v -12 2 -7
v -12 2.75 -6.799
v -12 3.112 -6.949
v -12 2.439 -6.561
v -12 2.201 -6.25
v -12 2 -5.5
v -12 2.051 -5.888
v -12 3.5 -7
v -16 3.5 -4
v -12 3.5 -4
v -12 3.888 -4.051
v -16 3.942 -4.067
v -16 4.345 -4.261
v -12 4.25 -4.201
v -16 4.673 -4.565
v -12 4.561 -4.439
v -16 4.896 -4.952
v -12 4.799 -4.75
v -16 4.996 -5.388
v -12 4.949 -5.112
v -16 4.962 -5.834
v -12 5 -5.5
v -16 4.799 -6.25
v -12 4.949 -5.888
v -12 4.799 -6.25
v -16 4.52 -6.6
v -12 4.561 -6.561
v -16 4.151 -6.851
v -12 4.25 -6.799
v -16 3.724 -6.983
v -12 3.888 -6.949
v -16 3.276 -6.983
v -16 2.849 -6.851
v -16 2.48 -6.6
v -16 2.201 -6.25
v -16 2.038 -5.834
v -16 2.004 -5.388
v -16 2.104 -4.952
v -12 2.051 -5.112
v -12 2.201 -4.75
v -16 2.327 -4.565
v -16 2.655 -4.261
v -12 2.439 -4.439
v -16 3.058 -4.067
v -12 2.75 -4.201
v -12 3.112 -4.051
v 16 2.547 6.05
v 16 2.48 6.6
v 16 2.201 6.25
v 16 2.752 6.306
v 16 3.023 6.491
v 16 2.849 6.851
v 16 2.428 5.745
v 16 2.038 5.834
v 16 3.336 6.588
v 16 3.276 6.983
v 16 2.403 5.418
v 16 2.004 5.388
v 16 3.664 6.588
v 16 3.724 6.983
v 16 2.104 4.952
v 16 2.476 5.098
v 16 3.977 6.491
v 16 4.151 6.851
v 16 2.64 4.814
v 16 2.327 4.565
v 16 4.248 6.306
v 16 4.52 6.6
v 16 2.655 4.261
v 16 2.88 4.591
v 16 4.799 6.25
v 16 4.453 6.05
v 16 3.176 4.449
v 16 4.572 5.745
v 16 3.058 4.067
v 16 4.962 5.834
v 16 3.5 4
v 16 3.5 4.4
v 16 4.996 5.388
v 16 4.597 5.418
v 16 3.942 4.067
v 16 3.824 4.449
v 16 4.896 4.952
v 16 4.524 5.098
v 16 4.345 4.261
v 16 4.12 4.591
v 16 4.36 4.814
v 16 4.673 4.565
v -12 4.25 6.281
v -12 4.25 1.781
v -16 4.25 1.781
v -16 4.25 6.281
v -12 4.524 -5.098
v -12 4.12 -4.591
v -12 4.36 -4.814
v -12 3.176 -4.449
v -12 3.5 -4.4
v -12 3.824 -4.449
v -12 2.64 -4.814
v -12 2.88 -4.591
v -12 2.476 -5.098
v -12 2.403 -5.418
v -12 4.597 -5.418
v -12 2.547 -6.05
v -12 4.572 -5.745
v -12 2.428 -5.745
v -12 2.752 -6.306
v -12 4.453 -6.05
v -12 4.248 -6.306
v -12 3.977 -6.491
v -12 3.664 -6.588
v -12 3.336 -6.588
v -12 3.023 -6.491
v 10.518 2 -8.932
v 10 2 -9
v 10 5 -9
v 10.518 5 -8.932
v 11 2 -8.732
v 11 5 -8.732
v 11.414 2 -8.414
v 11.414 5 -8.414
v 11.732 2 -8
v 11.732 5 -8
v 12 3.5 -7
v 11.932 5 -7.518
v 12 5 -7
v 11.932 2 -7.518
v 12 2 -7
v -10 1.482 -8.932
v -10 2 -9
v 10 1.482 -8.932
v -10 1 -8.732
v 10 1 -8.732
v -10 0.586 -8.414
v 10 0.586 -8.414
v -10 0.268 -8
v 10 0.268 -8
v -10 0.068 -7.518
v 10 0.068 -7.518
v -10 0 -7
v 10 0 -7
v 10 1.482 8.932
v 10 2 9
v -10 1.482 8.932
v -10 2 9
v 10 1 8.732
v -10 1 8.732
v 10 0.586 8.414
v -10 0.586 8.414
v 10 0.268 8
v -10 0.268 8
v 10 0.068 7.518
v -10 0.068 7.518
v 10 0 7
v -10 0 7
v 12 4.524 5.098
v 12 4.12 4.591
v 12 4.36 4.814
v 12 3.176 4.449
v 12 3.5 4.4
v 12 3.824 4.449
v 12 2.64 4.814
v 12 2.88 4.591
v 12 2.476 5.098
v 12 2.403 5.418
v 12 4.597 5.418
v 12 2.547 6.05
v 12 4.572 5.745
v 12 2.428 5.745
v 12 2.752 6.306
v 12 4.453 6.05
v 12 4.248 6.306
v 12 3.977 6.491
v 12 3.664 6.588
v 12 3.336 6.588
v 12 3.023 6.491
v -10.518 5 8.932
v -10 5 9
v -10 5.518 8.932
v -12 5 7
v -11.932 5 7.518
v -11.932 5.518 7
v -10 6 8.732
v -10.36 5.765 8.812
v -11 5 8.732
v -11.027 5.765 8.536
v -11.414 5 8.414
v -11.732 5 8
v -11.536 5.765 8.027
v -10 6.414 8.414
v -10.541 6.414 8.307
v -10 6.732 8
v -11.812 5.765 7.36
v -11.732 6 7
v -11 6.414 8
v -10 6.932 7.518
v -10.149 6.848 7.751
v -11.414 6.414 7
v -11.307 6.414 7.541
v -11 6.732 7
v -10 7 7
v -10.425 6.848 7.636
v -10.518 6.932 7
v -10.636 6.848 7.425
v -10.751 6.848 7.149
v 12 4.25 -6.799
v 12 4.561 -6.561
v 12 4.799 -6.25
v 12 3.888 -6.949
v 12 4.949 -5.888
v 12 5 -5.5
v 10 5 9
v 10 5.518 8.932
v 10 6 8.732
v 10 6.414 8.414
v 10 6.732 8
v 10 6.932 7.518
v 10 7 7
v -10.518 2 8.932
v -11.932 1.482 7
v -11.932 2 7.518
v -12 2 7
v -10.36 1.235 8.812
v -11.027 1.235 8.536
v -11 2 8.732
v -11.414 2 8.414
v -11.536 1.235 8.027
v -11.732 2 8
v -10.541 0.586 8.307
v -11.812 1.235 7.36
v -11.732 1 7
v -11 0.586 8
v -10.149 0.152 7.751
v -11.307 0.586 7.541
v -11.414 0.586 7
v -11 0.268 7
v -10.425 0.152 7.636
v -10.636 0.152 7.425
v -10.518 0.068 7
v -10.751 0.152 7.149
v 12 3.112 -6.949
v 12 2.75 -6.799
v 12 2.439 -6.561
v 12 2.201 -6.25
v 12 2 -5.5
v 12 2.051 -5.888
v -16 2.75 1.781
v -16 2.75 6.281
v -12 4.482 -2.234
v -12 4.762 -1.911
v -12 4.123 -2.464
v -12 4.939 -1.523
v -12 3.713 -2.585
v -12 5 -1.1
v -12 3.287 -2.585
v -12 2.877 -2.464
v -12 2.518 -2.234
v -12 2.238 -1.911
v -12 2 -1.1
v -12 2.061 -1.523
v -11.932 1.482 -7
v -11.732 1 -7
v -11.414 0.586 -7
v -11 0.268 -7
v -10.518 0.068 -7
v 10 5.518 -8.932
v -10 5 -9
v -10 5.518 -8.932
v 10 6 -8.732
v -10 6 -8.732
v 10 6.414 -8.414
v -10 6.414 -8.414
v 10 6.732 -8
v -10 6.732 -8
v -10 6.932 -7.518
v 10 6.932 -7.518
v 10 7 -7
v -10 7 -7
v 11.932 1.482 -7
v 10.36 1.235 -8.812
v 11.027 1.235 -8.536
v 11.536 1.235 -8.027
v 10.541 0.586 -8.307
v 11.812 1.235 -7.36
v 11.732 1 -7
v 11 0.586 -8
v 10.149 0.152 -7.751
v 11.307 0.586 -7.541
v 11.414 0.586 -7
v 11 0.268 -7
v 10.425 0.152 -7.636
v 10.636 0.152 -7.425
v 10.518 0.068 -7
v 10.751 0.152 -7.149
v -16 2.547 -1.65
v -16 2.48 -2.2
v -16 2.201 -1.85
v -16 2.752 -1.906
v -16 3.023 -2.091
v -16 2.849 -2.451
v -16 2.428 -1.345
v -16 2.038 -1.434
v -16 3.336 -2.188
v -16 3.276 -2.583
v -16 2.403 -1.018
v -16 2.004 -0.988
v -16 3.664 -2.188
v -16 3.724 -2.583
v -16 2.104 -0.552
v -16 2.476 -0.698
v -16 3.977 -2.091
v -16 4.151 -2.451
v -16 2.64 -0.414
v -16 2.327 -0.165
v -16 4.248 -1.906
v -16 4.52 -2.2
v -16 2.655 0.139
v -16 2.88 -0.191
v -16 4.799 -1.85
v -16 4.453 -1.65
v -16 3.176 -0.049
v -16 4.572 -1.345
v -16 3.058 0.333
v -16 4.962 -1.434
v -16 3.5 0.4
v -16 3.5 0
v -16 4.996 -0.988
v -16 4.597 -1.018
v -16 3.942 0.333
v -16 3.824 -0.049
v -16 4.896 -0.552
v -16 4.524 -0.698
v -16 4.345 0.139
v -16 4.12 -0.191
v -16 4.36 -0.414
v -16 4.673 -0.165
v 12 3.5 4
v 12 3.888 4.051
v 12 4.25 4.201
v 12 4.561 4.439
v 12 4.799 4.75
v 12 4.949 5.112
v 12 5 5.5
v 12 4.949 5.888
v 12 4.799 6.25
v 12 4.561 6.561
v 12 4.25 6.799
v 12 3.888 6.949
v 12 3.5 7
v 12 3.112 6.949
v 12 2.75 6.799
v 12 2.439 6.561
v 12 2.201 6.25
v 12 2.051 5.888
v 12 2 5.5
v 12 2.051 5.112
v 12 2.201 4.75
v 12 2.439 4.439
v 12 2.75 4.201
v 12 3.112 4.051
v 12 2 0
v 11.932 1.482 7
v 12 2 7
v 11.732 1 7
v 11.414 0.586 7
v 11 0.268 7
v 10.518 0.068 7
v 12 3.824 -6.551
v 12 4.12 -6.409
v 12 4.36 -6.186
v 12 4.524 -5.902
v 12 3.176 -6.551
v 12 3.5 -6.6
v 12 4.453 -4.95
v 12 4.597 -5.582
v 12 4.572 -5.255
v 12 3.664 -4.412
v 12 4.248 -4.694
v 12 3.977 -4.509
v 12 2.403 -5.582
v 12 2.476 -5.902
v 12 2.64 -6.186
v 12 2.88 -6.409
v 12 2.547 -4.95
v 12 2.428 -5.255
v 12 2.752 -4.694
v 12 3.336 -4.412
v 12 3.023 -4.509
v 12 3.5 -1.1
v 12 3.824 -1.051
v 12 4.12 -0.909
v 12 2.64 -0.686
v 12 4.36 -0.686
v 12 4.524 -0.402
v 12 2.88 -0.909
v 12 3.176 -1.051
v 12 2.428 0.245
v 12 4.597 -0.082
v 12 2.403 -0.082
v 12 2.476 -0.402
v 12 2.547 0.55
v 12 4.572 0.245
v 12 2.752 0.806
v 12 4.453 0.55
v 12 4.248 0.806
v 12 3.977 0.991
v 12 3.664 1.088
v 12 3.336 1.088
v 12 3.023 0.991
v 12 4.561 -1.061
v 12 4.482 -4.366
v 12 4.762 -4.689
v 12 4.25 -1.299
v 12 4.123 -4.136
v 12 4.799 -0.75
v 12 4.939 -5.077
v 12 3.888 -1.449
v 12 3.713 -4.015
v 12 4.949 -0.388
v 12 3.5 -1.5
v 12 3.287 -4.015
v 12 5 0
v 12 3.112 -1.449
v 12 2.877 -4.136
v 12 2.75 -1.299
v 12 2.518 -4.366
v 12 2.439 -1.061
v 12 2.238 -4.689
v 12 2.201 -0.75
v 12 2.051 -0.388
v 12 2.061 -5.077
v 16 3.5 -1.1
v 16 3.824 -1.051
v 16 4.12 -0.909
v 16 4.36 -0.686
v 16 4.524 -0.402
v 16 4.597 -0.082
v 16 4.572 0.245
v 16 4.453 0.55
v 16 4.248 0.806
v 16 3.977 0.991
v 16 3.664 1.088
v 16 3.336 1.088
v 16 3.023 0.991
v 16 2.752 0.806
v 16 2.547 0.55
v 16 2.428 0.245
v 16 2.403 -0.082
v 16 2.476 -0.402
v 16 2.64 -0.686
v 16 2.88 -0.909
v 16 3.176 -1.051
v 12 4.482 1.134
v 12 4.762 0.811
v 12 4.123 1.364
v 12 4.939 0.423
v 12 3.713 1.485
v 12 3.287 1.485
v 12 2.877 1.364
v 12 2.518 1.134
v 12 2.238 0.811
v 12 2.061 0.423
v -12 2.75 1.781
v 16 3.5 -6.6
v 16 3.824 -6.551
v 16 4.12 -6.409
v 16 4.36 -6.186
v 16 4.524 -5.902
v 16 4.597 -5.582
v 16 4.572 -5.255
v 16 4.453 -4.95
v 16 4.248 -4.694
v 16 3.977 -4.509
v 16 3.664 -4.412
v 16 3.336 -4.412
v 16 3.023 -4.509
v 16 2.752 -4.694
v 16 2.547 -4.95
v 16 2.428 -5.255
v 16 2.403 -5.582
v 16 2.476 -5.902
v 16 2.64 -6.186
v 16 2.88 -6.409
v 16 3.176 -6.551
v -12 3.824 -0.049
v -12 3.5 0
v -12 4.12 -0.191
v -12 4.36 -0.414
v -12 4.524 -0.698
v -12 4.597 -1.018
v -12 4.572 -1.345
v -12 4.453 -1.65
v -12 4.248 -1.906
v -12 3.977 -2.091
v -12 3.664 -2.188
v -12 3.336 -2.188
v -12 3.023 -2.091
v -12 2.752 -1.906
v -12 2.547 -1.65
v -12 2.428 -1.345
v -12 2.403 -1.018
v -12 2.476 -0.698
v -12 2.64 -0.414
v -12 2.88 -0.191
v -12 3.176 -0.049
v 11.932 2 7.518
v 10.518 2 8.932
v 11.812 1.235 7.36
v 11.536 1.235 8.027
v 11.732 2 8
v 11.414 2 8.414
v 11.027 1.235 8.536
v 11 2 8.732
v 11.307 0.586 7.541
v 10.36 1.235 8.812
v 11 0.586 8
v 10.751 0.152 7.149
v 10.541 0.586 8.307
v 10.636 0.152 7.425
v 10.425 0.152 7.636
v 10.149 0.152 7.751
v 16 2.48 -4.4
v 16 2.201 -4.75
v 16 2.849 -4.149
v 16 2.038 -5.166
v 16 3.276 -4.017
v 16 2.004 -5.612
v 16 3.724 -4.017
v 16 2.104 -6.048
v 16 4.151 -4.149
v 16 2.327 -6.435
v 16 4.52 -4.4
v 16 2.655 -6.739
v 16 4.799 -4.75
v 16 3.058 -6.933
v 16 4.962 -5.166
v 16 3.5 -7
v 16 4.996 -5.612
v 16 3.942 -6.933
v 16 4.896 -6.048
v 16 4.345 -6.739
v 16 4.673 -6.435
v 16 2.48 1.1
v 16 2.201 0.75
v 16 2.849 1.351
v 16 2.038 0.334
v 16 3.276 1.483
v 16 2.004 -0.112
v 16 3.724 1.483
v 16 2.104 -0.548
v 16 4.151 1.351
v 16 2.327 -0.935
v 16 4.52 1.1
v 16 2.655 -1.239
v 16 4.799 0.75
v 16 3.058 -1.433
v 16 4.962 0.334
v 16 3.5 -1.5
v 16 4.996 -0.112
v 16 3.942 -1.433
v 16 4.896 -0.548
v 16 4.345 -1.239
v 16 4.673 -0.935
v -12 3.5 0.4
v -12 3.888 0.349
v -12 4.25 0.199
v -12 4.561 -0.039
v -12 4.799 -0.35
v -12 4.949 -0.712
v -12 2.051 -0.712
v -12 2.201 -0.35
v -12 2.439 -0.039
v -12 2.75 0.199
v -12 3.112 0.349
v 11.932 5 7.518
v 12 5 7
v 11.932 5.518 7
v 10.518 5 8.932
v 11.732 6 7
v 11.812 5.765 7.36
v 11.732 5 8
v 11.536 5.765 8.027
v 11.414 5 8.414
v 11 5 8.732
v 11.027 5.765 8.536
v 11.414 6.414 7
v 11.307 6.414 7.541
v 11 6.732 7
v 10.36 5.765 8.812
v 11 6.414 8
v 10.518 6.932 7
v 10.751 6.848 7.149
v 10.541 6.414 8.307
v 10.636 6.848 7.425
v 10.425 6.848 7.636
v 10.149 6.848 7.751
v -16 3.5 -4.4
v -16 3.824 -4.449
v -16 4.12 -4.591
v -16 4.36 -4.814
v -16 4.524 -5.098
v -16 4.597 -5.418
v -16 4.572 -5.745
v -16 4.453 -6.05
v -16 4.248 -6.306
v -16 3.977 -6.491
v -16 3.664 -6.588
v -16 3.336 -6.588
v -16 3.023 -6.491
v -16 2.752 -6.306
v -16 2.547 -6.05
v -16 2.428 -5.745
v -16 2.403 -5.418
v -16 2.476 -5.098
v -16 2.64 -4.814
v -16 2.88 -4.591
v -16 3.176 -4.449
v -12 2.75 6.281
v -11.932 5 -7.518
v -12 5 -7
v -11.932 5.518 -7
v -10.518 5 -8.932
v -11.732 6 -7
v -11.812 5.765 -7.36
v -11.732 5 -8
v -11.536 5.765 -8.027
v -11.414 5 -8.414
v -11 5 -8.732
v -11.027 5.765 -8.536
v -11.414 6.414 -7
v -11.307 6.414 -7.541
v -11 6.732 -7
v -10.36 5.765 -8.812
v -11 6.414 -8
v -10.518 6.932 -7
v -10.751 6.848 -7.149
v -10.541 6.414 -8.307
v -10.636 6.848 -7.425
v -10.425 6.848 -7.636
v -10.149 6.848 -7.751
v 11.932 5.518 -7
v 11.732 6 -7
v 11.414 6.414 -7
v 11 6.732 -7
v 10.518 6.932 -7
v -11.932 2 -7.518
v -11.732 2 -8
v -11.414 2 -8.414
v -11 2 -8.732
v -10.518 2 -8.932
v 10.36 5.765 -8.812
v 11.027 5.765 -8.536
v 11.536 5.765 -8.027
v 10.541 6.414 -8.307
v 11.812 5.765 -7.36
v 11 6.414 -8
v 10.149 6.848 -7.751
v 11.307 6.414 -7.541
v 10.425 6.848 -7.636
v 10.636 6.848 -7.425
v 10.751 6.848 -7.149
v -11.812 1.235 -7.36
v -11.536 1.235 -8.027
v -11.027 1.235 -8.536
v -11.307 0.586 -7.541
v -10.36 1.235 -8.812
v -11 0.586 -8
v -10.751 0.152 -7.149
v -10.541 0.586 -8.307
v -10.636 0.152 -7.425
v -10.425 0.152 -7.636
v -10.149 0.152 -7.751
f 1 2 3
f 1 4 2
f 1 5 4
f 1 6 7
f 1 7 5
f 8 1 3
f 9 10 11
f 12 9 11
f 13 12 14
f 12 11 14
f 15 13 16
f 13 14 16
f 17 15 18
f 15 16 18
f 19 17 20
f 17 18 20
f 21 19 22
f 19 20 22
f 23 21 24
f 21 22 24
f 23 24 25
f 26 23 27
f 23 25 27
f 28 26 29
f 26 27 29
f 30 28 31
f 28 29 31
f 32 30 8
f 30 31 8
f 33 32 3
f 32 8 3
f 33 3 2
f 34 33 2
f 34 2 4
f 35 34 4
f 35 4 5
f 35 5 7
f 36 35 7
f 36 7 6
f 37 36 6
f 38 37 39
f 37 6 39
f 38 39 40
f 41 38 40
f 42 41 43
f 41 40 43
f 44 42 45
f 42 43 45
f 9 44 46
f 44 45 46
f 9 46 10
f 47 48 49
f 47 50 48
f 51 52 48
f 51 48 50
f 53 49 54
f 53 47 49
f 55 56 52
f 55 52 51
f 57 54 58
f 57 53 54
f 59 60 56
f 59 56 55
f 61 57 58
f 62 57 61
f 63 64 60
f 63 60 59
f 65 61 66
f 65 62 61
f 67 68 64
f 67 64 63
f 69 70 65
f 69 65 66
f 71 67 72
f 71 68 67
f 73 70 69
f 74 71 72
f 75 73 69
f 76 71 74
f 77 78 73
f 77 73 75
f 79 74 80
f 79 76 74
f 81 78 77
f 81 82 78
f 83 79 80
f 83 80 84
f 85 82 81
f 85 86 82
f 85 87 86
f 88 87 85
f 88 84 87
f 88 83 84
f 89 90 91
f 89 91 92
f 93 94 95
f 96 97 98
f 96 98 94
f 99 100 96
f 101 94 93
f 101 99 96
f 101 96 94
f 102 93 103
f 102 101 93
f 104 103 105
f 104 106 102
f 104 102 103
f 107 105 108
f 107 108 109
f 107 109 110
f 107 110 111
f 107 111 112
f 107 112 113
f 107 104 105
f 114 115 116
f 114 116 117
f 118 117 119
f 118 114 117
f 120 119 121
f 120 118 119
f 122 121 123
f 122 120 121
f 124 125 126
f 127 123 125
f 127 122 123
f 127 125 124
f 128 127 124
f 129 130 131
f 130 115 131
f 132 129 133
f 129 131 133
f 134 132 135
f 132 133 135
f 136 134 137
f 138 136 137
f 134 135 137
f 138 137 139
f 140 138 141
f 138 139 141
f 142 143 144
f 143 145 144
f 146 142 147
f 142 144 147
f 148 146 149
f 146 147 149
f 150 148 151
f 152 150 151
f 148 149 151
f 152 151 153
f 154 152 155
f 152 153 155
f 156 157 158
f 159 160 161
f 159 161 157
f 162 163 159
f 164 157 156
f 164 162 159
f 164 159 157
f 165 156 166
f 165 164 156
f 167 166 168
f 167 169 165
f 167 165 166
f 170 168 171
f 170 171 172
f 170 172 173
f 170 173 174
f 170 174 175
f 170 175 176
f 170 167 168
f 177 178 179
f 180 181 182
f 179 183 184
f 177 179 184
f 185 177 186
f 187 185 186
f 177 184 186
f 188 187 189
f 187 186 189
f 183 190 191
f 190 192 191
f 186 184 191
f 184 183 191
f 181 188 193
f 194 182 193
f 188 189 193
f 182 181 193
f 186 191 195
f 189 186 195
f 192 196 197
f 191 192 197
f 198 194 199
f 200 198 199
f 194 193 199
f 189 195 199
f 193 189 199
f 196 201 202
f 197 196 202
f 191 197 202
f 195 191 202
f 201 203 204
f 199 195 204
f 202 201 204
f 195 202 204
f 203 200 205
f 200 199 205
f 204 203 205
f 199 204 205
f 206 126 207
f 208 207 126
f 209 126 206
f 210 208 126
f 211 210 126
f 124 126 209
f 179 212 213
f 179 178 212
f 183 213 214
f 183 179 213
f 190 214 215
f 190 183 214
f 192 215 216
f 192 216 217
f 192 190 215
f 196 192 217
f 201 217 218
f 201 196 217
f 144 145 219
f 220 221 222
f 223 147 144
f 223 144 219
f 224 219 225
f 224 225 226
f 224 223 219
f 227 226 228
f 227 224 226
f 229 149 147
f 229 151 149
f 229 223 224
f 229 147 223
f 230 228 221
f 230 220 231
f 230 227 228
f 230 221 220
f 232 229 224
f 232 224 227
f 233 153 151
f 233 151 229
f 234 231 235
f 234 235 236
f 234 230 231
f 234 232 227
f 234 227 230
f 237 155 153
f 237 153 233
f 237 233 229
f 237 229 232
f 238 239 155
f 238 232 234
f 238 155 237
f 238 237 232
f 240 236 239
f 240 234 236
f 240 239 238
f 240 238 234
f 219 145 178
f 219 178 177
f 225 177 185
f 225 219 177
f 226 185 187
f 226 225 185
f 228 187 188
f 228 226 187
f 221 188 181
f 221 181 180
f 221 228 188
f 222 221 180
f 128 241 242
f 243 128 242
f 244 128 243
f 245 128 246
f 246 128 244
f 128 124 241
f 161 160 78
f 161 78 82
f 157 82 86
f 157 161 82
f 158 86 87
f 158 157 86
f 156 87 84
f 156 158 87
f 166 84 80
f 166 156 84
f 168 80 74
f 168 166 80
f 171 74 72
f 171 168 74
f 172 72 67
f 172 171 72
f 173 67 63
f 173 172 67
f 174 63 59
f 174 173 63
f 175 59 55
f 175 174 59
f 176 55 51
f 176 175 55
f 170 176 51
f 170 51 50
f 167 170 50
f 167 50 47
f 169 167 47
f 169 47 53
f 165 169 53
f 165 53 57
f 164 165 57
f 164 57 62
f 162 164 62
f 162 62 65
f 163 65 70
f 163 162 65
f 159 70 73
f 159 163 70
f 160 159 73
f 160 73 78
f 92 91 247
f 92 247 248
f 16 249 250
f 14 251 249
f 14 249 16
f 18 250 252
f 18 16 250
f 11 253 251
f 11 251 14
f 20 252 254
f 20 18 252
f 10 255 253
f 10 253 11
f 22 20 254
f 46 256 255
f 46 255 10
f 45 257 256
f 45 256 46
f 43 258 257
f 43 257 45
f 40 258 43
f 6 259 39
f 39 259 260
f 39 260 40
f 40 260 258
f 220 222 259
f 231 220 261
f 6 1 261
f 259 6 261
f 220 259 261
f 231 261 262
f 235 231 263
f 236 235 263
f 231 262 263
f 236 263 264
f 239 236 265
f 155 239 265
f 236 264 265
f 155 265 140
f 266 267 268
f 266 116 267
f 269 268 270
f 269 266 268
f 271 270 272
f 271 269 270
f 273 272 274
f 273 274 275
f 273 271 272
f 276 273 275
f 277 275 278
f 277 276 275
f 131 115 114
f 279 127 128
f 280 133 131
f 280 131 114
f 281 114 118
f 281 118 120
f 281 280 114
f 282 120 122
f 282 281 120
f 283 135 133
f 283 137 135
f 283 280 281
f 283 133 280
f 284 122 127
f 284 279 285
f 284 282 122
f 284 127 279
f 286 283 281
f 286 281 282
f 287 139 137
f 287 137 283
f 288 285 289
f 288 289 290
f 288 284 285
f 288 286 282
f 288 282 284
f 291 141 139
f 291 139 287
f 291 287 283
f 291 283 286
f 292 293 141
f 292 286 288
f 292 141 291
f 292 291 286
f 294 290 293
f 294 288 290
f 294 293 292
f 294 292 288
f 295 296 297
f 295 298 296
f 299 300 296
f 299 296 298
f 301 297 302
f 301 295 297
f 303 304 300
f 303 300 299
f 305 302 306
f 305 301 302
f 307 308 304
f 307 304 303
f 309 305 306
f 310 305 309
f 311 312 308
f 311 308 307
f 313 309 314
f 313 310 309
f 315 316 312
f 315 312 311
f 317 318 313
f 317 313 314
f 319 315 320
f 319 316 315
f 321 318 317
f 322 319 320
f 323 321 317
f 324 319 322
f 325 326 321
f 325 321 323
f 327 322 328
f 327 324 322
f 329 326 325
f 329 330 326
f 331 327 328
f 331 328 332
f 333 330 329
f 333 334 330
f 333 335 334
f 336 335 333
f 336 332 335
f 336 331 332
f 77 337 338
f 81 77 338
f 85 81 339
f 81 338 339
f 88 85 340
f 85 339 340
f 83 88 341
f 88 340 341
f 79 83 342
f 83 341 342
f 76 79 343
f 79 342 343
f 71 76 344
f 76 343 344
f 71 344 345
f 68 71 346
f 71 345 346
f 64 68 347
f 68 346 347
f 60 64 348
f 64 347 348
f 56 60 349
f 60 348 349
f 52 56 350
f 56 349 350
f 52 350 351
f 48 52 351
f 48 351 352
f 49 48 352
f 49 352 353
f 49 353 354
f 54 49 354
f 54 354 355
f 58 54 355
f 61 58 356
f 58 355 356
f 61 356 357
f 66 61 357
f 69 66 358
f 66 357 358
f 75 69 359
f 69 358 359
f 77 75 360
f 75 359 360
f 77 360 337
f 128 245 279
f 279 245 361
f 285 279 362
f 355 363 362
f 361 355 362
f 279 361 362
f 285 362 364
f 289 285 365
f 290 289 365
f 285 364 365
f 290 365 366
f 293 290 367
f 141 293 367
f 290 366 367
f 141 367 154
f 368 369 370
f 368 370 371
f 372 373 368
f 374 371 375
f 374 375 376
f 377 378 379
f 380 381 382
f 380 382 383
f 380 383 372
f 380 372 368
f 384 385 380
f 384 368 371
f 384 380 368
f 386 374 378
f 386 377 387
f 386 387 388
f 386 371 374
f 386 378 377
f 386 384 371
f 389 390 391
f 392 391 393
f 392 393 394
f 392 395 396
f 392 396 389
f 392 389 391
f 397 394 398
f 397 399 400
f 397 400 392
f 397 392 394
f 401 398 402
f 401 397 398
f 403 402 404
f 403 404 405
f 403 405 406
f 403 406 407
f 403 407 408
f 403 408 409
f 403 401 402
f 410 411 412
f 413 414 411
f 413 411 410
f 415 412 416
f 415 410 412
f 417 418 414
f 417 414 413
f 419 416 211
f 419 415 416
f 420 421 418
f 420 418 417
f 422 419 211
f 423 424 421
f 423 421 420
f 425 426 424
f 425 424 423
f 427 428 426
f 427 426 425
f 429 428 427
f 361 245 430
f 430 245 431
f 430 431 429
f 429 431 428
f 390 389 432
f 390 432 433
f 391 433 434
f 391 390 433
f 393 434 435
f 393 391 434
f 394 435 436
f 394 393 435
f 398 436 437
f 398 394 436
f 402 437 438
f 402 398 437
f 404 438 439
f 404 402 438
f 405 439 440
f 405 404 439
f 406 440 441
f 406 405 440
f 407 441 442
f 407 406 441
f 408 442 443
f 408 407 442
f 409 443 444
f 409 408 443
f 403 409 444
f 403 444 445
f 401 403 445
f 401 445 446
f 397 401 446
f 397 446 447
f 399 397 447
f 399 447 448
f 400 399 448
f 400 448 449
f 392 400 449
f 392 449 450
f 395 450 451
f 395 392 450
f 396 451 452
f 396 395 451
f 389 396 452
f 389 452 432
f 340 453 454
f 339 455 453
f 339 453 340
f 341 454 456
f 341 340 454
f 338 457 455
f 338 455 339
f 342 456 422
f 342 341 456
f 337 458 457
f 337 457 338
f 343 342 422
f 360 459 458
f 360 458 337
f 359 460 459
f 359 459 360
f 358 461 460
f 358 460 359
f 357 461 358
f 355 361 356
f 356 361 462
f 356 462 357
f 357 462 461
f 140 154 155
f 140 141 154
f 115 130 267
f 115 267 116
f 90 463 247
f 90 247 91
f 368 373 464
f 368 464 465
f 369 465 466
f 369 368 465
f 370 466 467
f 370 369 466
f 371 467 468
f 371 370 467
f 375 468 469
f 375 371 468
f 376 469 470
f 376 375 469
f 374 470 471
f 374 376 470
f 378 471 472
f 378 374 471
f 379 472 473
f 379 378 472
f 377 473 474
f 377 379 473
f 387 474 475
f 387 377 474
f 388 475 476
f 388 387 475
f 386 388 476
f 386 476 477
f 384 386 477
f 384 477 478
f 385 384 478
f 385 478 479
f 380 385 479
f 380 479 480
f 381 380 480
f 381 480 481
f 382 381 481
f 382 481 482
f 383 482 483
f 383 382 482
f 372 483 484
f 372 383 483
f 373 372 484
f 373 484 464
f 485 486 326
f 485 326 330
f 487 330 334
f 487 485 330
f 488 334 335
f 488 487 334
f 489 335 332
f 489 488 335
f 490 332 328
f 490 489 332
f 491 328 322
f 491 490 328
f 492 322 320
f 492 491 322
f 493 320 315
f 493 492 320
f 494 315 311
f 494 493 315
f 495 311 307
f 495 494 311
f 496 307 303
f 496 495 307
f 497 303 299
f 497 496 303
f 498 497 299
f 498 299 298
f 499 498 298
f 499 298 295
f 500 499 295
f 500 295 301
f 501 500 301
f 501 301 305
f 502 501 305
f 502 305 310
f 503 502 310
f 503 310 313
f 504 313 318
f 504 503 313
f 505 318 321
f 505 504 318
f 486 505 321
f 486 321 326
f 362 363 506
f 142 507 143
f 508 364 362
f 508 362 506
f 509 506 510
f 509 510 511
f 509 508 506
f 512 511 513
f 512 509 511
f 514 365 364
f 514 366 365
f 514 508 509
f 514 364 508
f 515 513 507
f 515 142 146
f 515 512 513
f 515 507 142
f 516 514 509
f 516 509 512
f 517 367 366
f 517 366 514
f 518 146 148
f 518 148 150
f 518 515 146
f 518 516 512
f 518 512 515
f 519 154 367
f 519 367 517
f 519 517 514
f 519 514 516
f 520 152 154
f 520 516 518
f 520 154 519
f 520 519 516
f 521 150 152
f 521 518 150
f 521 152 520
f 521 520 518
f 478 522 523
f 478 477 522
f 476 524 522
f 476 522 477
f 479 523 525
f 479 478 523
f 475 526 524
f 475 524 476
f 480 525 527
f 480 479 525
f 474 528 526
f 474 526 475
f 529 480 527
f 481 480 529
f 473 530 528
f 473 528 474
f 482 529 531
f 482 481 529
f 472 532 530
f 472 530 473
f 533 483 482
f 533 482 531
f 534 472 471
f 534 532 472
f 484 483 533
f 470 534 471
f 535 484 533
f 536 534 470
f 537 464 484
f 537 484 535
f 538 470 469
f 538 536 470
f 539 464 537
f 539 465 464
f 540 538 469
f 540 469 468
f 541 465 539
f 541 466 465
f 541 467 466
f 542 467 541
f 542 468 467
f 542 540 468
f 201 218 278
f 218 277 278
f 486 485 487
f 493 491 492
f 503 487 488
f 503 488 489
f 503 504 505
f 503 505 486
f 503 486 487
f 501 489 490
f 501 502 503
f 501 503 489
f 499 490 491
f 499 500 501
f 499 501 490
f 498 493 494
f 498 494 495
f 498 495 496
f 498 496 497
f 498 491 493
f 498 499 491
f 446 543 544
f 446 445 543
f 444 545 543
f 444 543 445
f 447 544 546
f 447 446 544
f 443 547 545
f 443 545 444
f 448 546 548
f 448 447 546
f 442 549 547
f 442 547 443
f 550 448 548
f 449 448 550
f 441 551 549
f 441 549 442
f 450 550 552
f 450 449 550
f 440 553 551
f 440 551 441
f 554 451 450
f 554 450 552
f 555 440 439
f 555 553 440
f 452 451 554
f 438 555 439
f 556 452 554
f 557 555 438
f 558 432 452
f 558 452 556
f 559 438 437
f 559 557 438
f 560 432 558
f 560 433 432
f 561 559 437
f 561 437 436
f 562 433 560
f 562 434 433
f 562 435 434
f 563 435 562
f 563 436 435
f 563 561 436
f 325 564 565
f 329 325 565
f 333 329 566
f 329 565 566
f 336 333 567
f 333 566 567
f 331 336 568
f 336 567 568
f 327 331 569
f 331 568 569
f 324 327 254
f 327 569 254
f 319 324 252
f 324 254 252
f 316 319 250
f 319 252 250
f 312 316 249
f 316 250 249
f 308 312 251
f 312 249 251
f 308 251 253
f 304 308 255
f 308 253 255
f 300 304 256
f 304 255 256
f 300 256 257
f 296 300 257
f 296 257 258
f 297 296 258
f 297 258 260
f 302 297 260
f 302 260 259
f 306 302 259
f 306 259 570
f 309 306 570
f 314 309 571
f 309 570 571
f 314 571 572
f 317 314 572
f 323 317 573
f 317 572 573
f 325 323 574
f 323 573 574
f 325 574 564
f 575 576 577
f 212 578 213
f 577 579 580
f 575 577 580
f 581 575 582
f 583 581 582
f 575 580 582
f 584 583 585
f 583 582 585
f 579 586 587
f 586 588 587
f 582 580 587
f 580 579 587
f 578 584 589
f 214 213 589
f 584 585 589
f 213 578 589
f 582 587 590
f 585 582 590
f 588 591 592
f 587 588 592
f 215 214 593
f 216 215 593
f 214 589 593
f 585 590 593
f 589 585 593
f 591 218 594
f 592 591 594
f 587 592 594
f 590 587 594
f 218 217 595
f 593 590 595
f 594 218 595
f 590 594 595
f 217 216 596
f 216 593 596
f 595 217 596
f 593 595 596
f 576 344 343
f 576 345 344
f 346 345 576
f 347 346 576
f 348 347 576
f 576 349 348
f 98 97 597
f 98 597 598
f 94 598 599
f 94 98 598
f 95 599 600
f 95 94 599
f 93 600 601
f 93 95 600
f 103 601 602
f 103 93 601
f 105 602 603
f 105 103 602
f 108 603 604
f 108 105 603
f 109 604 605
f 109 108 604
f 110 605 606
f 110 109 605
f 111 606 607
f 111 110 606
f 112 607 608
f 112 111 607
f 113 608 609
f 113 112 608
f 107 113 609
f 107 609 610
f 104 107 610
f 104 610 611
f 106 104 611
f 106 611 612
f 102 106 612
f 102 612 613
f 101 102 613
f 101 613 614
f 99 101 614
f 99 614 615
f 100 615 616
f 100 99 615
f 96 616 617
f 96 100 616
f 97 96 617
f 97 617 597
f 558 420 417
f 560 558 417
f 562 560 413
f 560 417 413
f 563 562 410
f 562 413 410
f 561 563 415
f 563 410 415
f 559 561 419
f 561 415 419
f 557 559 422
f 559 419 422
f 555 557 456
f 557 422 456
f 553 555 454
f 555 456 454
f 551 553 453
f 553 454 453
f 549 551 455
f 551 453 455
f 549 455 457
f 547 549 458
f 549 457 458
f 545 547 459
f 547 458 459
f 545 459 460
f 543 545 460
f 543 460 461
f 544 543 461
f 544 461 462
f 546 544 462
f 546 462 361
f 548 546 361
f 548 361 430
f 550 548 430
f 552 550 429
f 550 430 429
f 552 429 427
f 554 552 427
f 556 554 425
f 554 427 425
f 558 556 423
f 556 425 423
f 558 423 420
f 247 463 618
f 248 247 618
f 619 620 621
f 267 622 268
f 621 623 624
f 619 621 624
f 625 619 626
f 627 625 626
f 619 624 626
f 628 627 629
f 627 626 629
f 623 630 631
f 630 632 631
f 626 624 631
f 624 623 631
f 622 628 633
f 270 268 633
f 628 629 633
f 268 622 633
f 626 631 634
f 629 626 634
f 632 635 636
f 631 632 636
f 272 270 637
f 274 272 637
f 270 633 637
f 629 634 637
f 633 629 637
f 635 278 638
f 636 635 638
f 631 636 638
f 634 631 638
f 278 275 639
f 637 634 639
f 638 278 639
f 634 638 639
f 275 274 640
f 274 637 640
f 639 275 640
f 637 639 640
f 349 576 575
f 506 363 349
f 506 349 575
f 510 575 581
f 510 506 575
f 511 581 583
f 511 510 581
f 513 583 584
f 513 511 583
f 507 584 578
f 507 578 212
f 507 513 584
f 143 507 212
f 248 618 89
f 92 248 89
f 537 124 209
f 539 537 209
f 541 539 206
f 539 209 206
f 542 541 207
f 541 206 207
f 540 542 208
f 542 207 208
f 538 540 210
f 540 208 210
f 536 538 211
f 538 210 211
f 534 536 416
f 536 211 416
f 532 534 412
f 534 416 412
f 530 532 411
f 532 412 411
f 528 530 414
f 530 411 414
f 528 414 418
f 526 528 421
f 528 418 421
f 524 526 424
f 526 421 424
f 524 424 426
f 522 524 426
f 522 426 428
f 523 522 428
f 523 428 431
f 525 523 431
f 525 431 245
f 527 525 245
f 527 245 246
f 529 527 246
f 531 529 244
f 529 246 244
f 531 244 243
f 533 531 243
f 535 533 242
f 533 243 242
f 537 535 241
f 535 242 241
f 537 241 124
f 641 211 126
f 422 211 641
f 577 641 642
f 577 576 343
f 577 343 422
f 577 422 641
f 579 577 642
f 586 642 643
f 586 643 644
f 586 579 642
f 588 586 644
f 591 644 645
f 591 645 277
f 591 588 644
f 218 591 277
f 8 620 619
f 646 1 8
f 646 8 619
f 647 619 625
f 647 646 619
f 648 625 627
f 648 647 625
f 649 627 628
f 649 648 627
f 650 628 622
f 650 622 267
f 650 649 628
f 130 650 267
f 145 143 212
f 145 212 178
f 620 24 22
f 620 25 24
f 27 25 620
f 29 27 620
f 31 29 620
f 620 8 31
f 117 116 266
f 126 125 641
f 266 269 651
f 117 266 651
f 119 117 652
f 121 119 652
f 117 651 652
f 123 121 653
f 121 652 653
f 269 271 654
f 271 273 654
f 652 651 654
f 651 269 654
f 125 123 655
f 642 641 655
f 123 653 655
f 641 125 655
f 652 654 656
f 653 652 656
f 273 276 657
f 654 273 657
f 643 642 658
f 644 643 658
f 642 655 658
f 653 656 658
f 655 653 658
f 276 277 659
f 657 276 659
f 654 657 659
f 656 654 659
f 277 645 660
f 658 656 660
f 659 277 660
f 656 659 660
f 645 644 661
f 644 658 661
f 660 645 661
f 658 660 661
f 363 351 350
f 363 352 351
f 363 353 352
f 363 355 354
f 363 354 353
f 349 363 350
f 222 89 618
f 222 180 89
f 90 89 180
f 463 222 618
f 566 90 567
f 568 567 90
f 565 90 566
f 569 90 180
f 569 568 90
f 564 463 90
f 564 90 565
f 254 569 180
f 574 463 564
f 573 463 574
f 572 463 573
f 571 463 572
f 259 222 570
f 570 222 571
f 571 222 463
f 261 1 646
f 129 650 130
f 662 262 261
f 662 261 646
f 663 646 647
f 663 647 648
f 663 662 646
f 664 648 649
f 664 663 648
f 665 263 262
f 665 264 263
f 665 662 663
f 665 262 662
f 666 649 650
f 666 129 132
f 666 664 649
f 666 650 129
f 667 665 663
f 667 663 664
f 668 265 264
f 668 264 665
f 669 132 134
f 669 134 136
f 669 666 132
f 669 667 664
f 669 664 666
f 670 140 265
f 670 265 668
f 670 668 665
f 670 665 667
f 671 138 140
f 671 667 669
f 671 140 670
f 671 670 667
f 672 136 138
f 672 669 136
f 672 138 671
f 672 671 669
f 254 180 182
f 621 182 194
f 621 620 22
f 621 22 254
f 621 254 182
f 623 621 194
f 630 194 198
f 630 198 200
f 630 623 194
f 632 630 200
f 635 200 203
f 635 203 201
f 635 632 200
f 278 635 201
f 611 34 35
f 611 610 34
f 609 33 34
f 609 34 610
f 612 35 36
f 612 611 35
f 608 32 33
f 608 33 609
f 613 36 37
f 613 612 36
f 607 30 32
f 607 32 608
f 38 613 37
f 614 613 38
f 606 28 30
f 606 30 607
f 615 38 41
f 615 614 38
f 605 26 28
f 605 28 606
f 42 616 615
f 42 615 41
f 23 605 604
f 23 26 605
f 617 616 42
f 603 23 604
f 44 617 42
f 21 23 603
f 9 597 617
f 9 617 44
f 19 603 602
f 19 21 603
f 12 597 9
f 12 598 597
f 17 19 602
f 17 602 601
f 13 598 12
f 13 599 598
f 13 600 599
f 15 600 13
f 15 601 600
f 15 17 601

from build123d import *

# Parameters (mm, degrees)
BOSS_EXTRUDE1_DEPTH = 7
FILLET1_R           = 2
SKETCH2_R           = 1.5
SKETCH2_R_2         = 1.1
BOSS_EXTRUDE2_DEPTH = 4
SKETCH3_R           = 1.5
SKETCH3_R_2         = 1.1
SKETCH3_W           = 4.5
SKETCH3_H           = 1.5
BOSS_EXTRUDE3_DEPTH = 4


with BuildPart() as part:
    # Sketch1 → Boss-Extrude1 (new body)
    with BuildSketch(Plane(origin=(0, 0, 0), x_dir=(1, 0, 0), z_dir=(0, 1, 0))):
        with BuildLine():
            Line((10, -9), (-10, -9))
            ThreePointArc((-10, -9), (-11.414213562, -8.414213562), (-12, -7))
            Line((-12, -7), (-12, 7))
            ThreePointArc((-12, 7), (-11.414213562, 8.414213562), (-10, 9))
            Line((-10, 9), (10, 9))
            ThreePointArc((10, 9), (11.414213562, 8.414213562), (12, 7))
            Line((12, 7), (12, -7))
            ThreePointArc((12, -7), (11.414213562, -8.414213562), (10, -9))
        make_face()
    extrude(amount=BOSS_EXTRUDE1_DEPTH)

    # Fillet1
    fillet1_edges = [part.edges().sort_by_distance(p)[0] for p in [
        (11.414213562, 7, 8.414213562),
        (0, 0, 9),
        (-11.414213562, 0, 8.414213562),
        (12, 7, 0),
        (11.414213562, 7, -8.414213562),
        (0, 7, -9),
        (-11.414213562, 7, -8.414213562),
        (-12, 7, 0),
        (-11.414213562, 7, 8.414213562),
        (0, 7, 9),
        (-12, 0, 0),
        (-11.414213562, 0, -8.414213562),
        (0, 0, -9),
        (11.414213562, 0, -8.414213562),
        (12, 0, 0),
        (11.414213562, 0, 8.414213562),
    ]]
    fillet(fillet1_edges, radius=FILLET1_R)

    # Sketch2 → Boss-Extrude2 (add)
    with BuildSketch(Plane(origin=(12, 0, 0), x_dir=(0, 0, -1), z_dir=(1, 0, 0))):
        with Locations((0, 3.5)):
            Circle(SKETCH2_R)
        with Locations((0, 3.5)):
            Circle(SKETCH2_R_2, mode=Mode.SUBTRACT)
        with Locations((-5.5, 3.5)):
            Circle(SKETCH2_R)
        with Locations((-5.5, 3.5)):
            Circle(SKETCH2_R_2, mode=Mode.SUBTRACT)
        with Locations((5.5, 3.5)):
            Circle(SKETCH2_R)
        with Locations((5.5, 3.5)):
            Circle(SKETCH2_R_2, mode=Mode.SUBTRACT)
    extrude(amount=BOSS_EXTRUDE2_DEPTH)

    # Sketch3 → Boss-Extrude3 (add)
    with BuildSketch(Plane.ZY.offset(12)):
        with Locations((-5.5, 3.5)):
            Circle(SKETCH3_R)
        with Locations((-5.5, 3.5)):
            Circle(SKETCH3_R_2, mode=Mode.SUBTRACT)
        with Locations((-1.1, 3.5)):
            Circle(SKETCH3_R)
        with Locations((-1.1, 3.5)):
            Circle(SKETCH3_R_2, mode=Mode.SUBTRACT)
        with Locations((4.031327063, 3.5)):
            Rectangle(SKETCH3_W, SKETCH3_H)
    extrude(amount=BOSS_EXTRUDE3_DEPTH)


solid = part.part
